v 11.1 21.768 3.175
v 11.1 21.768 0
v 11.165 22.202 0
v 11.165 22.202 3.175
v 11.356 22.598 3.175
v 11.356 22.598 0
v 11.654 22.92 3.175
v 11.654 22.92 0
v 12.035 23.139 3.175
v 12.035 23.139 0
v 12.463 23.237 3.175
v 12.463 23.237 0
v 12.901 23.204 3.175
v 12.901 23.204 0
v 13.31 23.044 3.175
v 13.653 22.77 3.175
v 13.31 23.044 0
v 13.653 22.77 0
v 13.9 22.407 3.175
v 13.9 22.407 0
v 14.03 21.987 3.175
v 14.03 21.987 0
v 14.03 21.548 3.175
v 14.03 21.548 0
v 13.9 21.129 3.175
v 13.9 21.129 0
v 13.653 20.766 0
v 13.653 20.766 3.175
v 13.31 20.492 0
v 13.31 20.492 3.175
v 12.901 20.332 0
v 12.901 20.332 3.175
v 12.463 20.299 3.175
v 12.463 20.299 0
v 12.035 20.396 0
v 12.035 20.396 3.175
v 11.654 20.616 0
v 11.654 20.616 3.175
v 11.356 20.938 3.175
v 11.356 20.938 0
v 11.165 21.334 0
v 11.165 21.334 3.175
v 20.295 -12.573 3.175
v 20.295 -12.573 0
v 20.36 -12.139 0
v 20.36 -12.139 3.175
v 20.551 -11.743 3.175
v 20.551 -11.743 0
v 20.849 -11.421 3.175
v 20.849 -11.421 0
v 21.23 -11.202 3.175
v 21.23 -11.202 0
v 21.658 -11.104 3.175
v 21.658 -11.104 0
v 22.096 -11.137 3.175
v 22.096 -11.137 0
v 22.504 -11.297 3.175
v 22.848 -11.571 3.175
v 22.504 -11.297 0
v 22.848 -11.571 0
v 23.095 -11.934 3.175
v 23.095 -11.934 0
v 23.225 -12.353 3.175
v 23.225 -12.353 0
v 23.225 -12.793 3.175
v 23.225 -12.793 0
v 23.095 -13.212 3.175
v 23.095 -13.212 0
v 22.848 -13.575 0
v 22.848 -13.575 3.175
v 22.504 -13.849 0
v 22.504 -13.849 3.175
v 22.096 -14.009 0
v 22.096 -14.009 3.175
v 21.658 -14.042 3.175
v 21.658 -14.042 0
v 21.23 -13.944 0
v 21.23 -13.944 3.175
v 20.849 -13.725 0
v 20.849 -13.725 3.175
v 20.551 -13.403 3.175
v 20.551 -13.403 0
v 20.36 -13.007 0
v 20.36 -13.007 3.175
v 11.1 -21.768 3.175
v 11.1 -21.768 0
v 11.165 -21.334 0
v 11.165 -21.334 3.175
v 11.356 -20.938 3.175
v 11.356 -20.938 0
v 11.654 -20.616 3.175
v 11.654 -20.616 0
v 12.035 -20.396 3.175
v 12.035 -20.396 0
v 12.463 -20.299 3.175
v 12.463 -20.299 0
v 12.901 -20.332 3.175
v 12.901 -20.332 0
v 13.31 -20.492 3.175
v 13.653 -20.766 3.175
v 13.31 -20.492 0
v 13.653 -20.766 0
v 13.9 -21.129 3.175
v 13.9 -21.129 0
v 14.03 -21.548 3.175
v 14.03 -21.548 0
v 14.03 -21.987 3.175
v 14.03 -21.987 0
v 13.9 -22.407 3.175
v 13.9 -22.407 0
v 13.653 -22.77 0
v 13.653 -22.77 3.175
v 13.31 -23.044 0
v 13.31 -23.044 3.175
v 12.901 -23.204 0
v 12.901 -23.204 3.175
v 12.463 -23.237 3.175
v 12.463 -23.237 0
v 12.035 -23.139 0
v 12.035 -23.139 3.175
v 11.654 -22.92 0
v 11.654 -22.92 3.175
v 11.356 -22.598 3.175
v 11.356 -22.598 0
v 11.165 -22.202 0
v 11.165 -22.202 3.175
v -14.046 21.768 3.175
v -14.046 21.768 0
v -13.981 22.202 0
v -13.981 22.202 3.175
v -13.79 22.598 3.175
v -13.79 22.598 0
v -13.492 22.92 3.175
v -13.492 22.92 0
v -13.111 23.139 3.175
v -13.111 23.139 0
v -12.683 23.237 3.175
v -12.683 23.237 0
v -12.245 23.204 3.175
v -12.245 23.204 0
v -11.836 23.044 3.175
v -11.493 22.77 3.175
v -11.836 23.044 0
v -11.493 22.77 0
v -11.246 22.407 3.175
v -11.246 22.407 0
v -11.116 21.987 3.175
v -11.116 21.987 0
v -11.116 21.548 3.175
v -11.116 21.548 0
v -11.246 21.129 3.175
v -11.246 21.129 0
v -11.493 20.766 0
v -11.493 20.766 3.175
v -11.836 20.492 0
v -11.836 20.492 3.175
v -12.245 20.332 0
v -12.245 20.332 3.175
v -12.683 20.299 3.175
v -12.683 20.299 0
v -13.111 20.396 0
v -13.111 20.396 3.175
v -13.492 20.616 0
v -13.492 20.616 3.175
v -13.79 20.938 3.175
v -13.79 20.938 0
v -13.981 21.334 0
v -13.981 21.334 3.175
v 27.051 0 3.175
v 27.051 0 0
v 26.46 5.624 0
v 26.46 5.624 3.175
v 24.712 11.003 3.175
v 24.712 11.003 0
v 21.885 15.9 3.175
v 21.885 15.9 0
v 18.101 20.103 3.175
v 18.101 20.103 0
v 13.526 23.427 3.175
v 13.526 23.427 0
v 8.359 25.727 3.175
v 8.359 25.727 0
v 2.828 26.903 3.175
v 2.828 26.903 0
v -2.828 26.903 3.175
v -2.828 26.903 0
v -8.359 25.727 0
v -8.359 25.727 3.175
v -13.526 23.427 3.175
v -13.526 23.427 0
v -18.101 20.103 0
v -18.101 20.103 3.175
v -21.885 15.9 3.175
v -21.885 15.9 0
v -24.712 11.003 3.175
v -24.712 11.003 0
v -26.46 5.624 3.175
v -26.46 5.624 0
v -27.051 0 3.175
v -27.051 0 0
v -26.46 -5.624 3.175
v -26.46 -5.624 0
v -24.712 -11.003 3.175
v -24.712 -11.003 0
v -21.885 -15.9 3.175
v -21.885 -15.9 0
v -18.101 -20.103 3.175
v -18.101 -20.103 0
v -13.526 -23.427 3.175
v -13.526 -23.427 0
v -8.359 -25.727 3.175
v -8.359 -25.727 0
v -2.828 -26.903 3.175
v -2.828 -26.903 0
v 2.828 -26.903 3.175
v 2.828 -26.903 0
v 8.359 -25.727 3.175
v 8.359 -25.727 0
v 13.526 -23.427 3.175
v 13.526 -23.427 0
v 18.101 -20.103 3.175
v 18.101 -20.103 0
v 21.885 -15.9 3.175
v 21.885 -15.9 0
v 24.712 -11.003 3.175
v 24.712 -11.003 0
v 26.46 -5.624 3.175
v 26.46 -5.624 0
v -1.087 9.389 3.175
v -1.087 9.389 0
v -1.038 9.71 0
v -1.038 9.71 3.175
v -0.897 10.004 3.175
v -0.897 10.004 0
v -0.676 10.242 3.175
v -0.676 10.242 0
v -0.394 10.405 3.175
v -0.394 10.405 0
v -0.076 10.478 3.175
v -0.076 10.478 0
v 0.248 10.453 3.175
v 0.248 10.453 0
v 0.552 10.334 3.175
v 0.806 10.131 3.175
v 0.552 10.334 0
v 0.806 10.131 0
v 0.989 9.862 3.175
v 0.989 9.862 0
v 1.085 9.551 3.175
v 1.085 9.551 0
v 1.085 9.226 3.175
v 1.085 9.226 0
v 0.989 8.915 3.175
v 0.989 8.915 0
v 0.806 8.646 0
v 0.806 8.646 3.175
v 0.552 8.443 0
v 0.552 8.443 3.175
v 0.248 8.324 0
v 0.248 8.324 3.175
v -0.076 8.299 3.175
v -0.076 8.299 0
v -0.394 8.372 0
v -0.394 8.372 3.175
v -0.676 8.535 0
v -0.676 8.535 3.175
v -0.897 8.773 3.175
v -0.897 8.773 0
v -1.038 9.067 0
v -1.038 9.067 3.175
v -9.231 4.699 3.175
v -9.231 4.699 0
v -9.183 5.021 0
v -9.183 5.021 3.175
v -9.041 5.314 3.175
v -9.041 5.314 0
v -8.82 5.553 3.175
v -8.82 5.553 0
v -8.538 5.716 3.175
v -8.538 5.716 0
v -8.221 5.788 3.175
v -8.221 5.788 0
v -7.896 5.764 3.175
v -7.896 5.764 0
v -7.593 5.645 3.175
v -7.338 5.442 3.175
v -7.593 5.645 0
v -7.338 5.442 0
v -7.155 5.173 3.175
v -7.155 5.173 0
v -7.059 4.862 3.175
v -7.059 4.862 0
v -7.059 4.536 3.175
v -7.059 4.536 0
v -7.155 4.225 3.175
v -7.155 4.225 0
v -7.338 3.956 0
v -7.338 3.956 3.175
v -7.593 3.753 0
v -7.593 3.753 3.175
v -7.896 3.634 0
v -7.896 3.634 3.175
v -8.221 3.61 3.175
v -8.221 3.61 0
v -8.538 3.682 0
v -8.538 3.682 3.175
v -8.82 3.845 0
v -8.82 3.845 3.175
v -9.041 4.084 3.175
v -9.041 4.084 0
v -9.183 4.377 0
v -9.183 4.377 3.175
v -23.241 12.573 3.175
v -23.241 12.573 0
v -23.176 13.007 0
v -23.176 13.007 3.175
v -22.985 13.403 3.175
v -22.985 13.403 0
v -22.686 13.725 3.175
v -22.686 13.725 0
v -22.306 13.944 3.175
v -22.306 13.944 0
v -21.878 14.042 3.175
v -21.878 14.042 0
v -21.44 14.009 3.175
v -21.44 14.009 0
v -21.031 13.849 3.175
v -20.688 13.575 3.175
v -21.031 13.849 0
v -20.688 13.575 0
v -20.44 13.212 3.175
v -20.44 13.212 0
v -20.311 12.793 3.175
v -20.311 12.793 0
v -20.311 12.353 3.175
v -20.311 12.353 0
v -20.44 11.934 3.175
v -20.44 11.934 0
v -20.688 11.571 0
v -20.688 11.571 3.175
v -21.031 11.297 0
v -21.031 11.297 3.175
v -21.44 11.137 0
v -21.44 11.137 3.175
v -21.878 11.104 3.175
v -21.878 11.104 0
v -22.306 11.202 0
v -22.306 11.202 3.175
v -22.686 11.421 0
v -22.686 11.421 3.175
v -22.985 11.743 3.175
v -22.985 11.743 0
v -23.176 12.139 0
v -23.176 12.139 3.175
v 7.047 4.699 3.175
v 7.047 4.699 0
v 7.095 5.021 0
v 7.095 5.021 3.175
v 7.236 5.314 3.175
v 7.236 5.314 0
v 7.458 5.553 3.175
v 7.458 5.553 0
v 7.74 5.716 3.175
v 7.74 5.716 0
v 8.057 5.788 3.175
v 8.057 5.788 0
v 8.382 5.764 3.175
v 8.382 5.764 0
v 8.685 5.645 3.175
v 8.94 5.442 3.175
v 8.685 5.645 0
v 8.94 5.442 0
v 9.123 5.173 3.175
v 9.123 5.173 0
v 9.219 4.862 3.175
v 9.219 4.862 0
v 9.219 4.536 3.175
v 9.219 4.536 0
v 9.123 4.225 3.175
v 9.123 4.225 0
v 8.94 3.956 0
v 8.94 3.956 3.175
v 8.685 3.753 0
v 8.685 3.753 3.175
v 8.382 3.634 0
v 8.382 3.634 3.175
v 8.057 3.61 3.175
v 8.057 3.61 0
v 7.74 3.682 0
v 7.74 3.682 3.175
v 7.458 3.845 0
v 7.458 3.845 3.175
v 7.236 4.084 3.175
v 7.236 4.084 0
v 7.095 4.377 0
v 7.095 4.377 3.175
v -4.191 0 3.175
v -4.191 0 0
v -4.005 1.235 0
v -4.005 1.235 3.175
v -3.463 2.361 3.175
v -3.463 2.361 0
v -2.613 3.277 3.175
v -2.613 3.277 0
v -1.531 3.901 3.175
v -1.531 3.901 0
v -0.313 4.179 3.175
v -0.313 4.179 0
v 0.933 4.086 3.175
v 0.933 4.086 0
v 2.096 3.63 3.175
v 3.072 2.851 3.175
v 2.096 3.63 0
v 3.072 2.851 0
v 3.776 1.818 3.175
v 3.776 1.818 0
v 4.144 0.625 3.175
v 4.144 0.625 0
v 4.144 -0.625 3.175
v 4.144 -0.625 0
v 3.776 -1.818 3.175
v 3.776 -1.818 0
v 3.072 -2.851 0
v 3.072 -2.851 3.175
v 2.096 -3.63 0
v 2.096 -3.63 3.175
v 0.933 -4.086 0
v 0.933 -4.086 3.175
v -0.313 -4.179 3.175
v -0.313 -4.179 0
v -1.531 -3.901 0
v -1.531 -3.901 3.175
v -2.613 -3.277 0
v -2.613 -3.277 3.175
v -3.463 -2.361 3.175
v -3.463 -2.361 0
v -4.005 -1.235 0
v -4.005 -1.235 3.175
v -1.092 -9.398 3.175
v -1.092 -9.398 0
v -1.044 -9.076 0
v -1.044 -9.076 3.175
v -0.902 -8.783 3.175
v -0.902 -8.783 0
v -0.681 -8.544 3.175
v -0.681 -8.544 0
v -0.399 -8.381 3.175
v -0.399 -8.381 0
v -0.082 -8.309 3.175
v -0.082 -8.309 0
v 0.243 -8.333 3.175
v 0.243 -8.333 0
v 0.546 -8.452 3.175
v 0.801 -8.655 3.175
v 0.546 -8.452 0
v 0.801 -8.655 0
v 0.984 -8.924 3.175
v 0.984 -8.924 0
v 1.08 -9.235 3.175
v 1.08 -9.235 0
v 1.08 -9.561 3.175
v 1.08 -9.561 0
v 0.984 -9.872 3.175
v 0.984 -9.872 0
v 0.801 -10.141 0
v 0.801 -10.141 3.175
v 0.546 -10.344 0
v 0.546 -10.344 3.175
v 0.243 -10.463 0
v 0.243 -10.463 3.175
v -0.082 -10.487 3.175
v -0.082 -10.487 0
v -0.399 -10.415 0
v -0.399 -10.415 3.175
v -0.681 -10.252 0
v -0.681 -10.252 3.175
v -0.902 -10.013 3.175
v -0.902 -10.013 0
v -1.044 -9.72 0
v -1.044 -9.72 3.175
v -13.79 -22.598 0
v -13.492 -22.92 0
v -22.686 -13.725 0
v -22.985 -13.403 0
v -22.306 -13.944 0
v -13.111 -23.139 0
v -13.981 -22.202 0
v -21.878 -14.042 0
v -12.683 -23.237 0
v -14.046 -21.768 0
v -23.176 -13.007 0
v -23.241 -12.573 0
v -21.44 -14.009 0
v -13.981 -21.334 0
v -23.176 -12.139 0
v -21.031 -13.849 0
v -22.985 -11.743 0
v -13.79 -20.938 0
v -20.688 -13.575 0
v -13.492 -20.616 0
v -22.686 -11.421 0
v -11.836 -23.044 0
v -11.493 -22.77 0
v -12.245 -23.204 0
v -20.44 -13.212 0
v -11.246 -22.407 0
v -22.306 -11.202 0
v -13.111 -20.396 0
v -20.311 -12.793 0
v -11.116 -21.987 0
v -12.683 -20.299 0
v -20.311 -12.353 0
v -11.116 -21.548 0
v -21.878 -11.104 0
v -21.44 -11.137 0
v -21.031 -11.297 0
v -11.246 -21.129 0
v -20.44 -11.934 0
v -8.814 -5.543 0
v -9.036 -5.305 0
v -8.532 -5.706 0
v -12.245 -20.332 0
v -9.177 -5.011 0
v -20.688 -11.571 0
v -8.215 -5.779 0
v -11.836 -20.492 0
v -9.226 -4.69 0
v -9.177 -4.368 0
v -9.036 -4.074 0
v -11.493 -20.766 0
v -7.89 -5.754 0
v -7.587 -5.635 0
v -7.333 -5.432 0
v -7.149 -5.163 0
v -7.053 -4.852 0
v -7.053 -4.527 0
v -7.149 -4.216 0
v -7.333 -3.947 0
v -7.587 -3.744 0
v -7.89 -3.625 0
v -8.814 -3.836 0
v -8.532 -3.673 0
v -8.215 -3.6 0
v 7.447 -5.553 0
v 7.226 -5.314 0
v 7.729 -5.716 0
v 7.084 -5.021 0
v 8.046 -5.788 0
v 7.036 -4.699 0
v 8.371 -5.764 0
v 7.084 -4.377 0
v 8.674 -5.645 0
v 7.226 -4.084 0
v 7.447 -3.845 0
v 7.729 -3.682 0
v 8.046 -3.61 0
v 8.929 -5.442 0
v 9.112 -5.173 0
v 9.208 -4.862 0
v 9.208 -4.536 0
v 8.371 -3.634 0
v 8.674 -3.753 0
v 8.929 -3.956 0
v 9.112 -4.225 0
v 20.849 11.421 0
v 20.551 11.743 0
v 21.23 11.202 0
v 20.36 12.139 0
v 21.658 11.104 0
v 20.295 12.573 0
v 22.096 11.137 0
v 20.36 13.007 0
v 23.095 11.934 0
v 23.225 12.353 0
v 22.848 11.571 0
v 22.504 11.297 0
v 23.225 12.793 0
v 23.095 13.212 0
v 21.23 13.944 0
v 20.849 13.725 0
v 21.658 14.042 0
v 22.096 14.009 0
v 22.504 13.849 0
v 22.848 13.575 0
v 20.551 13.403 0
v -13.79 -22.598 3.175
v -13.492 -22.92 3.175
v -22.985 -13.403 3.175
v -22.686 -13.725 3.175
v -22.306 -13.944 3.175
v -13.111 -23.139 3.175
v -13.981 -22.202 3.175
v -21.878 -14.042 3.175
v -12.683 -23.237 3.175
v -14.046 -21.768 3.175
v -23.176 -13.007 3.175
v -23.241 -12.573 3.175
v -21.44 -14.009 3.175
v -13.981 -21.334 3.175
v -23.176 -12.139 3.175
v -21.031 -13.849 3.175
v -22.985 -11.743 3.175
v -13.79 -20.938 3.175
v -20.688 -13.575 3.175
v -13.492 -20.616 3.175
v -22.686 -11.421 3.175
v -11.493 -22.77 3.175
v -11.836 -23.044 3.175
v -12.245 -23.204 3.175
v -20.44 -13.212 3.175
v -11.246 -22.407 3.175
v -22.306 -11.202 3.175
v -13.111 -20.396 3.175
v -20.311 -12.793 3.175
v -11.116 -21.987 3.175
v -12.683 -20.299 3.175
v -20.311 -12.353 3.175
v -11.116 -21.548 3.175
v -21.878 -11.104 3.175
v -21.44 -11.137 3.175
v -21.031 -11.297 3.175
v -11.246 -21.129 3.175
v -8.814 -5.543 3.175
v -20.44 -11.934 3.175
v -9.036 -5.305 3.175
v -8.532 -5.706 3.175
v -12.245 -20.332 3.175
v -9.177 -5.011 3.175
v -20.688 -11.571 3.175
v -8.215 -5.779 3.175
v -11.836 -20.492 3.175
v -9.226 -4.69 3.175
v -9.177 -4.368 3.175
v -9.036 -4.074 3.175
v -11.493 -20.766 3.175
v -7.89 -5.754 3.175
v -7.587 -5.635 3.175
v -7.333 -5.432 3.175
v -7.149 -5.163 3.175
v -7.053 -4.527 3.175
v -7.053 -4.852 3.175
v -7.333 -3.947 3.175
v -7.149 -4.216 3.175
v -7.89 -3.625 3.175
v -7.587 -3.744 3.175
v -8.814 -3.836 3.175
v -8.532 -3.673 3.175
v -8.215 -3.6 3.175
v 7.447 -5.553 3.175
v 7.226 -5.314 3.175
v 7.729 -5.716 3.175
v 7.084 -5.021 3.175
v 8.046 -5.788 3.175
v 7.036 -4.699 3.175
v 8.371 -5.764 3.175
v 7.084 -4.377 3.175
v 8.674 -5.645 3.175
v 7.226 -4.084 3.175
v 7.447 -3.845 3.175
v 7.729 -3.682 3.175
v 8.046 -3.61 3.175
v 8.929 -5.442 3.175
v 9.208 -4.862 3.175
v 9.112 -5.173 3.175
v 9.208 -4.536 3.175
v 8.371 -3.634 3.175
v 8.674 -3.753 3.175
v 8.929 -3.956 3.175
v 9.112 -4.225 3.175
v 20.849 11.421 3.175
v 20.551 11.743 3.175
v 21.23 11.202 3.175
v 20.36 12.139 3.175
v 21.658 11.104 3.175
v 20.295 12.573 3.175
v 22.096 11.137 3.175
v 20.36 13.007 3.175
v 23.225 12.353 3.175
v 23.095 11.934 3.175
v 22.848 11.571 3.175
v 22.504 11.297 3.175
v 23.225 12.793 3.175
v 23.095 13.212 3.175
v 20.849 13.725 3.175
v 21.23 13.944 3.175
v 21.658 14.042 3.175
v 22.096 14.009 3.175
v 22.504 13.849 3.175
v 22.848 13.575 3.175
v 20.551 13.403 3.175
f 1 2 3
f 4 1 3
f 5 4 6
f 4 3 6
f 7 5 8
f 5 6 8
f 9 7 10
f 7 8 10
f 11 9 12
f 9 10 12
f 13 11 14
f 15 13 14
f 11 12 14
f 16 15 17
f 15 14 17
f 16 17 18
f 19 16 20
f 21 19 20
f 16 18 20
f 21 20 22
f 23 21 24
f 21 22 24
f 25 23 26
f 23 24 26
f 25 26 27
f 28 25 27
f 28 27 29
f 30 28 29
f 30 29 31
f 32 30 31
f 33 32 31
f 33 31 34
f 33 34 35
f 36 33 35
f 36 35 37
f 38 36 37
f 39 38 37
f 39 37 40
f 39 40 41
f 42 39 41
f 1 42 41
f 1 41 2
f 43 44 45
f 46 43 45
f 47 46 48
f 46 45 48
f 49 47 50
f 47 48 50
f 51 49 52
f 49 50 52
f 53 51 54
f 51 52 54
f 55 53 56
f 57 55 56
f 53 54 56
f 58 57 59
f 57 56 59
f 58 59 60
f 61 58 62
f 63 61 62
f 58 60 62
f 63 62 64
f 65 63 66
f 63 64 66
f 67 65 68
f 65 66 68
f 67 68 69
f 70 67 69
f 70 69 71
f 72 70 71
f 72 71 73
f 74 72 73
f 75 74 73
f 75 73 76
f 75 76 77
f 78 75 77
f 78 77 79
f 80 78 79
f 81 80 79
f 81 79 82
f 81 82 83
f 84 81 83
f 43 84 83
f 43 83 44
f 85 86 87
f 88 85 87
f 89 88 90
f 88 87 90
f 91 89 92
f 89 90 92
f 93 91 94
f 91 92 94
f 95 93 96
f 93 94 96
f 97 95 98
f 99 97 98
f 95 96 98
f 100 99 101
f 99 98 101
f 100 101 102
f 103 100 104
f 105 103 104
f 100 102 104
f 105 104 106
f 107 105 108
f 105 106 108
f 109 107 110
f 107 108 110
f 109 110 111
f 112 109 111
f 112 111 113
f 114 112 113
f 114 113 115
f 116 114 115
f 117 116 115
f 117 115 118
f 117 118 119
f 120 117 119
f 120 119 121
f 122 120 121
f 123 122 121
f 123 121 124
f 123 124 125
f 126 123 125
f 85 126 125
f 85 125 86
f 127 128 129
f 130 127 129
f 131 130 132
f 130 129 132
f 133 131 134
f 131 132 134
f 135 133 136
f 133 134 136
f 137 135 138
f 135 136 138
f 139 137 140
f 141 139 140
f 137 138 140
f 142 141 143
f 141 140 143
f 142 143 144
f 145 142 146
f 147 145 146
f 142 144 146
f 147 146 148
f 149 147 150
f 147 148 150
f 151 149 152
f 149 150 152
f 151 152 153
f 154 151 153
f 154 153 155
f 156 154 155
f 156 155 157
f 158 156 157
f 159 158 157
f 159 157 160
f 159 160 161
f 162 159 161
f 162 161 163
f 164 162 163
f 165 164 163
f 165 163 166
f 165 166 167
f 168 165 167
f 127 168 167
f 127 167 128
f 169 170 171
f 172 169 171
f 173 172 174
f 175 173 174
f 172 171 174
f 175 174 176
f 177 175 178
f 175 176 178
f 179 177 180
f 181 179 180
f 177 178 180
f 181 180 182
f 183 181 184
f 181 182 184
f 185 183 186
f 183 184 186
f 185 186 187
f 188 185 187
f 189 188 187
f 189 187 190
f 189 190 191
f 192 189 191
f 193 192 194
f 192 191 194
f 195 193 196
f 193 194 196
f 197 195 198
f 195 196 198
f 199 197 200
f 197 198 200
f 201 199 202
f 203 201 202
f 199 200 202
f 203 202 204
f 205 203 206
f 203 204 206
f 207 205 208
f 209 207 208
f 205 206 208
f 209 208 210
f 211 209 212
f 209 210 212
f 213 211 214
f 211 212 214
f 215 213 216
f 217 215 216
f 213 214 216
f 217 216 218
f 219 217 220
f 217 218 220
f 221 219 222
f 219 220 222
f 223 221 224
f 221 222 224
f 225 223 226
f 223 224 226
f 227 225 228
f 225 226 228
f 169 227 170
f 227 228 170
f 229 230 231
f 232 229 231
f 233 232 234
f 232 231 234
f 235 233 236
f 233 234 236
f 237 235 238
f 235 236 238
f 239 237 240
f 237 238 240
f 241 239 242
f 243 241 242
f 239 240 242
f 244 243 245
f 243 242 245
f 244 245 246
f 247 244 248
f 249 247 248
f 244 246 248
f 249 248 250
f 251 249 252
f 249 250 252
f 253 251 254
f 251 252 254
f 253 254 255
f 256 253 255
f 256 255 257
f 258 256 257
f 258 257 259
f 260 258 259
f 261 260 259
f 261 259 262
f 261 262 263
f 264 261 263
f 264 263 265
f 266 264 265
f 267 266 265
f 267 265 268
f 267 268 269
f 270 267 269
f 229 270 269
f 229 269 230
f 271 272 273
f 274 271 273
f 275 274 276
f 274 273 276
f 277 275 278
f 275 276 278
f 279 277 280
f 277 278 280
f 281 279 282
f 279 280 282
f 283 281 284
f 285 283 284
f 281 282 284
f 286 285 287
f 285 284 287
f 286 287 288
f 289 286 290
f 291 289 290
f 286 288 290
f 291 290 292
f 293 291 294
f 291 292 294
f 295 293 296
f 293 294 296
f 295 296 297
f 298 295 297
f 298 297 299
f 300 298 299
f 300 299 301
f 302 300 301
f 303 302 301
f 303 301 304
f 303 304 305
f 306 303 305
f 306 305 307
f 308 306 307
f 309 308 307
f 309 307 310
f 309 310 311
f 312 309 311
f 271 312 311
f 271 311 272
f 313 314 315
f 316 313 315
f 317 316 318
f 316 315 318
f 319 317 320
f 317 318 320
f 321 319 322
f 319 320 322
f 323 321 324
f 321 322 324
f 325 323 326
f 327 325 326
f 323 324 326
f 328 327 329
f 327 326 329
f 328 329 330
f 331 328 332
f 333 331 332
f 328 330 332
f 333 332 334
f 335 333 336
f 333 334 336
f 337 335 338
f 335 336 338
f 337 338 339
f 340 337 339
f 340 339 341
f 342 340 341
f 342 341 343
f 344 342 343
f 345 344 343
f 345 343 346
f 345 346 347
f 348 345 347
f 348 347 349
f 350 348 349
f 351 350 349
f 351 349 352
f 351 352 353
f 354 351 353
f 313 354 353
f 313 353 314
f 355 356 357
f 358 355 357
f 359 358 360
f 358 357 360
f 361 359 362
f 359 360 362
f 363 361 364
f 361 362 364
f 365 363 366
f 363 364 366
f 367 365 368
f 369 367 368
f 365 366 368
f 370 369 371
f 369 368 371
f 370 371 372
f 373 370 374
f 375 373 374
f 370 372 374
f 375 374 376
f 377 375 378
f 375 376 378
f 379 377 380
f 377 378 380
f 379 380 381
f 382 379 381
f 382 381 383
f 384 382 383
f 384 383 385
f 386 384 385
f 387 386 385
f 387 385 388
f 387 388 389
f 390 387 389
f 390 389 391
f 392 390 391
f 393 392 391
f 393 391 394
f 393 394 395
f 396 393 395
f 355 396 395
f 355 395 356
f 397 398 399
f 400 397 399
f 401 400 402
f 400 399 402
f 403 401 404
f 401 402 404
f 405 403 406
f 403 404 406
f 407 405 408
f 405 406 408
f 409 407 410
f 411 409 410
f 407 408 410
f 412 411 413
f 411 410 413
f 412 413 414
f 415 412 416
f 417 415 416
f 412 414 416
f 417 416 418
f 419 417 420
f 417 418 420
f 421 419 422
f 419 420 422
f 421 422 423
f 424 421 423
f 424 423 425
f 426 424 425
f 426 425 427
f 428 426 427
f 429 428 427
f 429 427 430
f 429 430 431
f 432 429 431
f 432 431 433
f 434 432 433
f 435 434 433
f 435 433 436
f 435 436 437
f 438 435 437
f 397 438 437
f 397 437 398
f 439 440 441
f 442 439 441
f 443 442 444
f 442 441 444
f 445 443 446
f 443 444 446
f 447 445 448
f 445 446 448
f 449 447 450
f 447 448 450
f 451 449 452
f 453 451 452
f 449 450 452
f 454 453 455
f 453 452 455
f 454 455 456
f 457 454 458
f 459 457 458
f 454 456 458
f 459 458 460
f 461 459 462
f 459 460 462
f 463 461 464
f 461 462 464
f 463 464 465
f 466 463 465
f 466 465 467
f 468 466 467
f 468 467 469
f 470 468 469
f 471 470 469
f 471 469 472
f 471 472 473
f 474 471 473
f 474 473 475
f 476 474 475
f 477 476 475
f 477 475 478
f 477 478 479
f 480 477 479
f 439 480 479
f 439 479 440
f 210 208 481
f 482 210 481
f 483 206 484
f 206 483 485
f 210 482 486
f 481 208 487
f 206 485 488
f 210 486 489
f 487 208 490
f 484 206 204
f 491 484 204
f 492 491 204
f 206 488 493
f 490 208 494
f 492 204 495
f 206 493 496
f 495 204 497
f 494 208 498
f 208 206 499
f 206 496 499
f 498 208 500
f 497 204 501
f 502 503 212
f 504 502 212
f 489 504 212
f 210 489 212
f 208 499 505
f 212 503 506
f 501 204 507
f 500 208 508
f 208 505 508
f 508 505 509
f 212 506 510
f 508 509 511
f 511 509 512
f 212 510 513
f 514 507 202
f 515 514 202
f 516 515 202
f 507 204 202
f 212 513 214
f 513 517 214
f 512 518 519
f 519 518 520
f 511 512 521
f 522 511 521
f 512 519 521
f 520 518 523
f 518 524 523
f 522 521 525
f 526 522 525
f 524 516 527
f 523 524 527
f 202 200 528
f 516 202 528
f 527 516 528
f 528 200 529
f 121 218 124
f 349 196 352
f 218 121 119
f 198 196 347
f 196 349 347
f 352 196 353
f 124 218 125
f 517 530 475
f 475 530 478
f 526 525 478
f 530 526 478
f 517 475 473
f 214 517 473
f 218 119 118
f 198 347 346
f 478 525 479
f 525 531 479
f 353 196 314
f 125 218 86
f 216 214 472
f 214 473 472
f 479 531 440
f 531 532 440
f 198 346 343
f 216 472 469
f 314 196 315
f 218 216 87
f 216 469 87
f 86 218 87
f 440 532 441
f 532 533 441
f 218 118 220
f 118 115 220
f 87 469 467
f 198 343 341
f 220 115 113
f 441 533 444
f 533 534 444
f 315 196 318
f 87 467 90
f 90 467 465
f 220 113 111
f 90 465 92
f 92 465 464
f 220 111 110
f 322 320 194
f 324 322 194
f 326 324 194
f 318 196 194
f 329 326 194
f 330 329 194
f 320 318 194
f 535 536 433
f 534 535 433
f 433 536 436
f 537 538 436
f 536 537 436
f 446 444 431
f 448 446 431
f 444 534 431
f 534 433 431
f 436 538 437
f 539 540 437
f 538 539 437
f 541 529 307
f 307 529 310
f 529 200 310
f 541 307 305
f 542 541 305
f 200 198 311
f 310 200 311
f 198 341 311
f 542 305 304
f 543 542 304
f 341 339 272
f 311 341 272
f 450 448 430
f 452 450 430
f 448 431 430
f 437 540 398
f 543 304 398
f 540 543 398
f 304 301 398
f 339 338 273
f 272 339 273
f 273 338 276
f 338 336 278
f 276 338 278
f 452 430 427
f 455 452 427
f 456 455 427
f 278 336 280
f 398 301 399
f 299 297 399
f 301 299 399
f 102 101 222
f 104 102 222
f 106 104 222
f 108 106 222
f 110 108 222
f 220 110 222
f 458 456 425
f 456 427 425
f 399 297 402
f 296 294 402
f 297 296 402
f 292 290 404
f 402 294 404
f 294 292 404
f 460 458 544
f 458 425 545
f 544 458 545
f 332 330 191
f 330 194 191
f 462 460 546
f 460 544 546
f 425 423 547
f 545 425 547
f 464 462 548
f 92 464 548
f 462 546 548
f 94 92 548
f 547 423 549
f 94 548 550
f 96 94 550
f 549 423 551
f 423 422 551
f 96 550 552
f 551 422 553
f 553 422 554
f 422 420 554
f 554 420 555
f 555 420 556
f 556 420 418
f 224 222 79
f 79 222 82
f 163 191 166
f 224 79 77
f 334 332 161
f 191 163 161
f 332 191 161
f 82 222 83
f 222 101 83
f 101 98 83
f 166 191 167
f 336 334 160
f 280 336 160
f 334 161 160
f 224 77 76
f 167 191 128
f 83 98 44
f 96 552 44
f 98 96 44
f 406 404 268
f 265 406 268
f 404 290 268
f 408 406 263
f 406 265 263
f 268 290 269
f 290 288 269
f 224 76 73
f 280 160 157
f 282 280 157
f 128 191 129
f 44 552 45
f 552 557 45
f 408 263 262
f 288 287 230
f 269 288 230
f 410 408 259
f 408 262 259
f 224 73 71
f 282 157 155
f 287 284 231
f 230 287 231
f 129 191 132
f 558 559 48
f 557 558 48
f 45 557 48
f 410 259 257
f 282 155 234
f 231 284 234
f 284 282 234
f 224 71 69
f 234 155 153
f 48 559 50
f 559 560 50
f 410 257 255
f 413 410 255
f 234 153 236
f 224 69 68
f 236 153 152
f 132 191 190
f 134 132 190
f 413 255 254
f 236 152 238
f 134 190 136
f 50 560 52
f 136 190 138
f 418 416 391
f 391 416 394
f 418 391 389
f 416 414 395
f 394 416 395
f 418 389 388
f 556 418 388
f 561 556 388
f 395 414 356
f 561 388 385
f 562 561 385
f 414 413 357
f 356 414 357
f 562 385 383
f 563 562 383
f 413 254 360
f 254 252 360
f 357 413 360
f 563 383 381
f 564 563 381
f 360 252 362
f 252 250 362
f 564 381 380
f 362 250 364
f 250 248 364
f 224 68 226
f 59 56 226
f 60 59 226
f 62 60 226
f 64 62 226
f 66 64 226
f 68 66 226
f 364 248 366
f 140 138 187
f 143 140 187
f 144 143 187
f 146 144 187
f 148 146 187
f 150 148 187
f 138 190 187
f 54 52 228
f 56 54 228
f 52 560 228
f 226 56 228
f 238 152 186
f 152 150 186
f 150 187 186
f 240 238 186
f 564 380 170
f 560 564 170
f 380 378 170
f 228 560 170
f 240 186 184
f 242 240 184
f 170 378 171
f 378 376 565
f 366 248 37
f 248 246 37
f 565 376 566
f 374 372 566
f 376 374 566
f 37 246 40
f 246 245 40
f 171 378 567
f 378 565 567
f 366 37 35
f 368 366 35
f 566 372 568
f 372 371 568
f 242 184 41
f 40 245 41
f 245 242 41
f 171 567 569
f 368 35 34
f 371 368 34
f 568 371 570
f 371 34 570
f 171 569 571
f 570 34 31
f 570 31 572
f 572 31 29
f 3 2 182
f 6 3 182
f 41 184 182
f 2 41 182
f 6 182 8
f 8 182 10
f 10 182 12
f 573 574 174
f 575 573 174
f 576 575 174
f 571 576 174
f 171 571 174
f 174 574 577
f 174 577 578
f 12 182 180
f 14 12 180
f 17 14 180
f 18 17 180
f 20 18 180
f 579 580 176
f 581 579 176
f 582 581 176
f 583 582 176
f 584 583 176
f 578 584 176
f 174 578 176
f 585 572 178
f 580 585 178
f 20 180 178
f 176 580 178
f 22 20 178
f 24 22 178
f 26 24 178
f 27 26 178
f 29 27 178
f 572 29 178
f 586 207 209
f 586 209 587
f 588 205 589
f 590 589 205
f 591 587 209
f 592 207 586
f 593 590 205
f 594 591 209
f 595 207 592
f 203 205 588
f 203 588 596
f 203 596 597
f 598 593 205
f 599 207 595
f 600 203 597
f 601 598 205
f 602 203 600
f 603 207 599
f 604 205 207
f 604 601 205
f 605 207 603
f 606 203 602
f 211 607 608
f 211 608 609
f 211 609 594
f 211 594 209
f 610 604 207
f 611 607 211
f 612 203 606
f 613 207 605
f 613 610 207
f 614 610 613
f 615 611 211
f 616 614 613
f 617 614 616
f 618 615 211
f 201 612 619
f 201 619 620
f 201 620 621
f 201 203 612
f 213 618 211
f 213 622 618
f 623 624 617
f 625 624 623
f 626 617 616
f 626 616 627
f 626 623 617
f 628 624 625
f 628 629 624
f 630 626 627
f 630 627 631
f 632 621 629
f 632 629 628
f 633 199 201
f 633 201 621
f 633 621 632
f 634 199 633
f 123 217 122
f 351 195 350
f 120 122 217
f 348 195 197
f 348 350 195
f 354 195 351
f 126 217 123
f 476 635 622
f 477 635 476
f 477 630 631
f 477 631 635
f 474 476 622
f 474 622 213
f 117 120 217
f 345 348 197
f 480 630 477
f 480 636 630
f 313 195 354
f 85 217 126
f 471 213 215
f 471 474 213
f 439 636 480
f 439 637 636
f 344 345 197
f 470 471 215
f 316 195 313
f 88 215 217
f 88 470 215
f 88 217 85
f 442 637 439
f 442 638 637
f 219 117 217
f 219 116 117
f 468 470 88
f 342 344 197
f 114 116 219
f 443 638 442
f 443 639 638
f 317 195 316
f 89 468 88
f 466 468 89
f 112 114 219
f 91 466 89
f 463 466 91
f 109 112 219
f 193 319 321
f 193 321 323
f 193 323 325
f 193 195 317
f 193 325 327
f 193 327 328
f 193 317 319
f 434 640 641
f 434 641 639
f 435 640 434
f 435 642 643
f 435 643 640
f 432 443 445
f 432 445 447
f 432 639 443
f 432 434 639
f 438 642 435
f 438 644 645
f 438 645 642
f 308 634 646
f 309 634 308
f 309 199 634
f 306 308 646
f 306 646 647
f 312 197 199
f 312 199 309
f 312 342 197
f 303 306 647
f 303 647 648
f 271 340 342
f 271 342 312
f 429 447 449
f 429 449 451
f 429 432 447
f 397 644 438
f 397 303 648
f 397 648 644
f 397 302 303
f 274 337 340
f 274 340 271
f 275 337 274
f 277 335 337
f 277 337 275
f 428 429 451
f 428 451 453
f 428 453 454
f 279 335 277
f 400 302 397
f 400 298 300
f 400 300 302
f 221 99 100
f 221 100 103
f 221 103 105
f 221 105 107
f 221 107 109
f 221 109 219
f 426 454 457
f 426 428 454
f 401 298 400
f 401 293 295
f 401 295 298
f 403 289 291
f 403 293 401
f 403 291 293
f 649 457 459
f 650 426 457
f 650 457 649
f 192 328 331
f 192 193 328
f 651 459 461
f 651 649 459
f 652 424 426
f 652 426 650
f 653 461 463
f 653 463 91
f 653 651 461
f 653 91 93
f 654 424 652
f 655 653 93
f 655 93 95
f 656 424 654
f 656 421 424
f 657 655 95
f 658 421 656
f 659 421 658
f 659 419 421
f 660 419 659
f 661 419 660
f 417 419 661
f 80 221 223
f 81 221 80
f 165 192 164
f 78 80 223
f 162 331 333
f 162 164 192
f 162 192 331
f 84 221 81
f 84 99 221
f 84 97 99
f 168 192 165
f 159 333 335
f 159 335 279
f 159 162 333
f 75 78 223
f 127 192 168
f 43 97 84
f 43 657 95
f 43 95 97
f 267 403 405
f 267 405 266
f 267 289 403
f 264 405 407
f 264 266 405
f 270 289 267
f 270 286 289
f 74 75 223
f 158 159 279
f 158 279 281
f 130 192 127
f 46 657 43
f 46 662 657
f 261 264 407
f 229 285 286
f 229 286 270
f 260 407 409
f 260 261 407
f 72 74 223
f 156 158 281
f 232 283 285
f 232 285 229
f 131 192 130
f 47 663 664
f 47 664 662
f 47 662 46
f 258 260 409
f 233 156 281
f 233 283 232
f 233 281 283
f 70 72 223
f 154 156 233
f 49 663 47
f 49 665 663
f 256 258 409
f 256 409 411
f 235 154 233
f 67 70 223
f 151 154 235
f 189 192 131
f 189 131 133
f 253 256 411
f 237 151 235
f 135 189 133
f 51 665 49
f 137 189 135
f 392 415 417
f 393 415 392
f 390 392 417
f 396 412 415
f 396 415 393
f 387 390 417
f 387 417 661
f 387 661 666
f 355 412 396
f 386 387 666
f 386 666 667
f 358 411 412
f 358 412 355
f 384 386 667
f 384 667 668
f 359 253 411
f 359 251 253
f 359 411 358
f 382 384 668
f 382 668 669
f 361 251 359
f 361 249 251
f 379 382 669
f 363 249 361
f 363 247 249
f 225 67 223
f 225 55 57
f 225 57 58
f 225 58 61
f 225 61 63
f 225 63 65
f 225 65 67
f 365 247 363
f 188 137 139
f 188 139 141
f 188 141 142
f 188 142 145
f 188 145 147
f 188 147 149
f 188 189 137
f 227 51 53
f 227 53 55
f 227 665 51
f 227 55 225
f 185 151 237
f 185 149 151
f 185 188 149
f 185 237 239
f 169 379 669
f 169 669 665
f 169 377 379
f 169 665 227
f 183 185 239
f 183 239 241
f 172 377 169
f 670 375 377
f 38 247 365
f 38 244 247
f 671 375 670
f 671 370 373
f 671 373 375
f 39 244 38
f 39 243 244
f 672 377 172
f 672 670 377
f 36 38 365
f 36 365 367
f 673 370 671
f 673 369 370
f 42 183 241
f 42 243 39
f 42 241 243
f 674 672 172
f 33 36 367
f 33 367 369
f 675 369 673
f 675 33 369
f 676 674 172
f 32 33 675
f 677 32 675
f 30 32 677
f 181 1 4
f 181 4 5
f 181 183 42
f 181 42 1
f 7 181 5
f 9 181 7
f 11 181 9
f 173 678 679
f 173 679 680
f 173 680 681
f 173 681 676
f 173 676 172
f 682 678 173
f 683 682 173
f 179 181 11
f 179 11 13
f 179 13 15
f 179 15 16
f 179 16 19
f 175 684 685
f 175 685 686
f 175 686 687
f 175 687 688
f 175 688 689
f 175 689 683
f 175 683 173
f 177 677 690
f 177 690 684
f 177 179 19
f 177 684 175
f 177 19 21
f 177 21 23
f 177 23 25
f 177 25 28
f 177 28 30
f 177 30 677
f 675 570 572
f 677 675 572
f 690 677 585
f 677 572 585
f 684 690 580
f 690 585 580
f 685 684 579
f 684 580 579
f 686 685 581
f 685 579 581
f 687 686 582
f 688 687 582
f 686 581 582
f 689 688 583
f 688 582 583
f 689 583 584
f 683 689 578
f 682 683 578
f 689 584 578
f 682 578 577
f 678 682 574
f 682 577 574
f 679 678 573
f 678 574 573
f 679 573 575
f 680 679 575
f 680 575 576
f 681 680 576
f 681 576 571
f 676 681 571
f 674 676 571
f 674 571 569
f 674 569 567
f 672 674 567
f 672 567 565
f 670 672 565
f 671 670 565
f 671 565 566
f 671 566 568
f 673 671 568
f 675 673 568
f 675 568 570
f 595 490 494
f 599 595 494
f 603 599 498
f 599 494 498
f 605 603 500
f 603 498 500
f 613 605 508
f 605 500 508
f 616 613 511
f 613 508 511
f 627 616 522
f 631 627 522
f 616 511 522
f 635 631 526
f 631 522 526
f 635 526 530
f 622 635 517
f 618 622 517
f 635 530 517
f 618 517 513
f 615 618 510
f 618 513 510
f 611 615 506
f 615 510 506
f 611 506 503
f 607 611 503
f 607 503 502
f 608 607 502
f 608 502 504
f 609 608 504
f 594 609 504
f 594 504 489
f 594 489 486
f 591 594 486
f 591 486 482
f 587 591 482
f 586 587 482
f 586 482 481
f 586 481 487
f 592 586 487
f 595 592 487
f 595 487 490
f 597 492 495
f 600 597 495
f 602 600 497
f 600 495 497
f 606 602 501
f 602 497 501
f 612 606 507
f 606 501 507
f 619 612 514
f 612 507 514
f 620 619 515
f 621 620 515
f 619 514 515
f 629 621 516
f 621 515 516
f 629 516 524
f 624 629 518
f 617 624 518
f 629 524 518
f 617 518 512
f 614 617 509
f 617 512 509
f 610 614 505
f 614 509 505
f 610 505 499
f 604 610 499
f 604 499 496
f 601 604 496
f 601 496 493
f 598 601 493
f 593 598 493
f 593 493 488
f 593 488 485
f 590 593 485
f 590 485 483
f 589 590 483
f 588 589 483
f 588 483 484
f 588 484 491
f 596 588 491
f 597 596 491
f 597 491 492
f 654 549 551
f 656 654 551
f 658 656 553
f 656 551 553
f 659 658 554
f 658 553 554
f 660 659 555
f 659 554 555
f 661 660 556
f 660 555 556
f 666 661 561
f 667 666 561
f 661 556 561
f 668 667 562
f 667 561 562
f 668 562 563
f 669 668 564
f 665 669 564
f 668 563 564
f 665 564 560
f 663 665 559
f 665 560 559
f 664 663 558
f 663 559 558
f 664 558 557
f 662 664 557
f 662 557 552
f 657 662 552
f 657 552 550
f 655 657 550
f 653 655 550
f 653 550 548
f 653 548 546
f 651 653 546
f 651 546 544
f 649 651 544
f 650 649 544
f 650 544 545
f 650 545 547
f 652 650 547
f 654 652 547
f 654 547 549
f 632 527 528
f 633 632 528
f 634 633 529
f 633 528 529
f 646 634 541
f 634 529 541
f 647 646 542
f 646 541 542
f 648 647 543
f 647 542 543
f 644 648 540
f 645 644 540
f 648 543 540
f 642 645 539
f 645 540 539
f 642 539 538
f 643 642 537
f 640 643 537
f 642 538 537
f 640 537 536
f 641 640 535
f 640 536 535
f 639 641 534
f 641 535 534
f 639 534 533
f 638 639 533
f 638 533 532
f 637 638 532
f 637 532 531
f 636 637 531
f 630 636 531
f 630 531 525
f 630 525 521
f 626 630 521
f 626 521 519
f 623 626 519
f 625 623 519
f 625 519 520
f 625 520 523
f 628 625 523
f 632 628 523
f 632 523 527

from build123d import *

# Parameters (mm, degrees)
F0_R     = 27.051
F1_DEPTH = 3.175
F4_D     = 2.9464
F5_D     = 2.1844
F7_D     = 8.382


with BuildPart() as f1:
    # F0 (on Top) → F1 (new body)
    with BuildSketch(Plane.XY):
        Circle(F0_R)
    extrude(amount=F1_DEPTH)

    # F4 (through all)
    with Locations(Plane.XY.offset(3.175)):
        with Locations((12.573, 21.7678), (21.7678, 12.573), (21.7678, -12.573), (12.573, -21.7678), (-12.573, -21.7678), (-12.573, 21.7678), (-21.7678, 12.573), (-21.7678, -12.573)):
            Hole(F4_D / 2)

    # F5 (through all)
    with Locations(Plane.XY.offset(3.175)):
        with Locations((8.128, -4.699), (8.1389067448, 4.699), (0.0054533724, 9.388554482), (-8.1389067448, 4.699), (-8.1334533724, -4.689554482), (0, -9.398)):
            Hole(F5_D / 2)

    # F7 (through all)
    with Locations(Plane.XY.offset(3.175)):
        with Locations((0, 0)):
            Hole(F7_D / 2)


solid = f1.part
